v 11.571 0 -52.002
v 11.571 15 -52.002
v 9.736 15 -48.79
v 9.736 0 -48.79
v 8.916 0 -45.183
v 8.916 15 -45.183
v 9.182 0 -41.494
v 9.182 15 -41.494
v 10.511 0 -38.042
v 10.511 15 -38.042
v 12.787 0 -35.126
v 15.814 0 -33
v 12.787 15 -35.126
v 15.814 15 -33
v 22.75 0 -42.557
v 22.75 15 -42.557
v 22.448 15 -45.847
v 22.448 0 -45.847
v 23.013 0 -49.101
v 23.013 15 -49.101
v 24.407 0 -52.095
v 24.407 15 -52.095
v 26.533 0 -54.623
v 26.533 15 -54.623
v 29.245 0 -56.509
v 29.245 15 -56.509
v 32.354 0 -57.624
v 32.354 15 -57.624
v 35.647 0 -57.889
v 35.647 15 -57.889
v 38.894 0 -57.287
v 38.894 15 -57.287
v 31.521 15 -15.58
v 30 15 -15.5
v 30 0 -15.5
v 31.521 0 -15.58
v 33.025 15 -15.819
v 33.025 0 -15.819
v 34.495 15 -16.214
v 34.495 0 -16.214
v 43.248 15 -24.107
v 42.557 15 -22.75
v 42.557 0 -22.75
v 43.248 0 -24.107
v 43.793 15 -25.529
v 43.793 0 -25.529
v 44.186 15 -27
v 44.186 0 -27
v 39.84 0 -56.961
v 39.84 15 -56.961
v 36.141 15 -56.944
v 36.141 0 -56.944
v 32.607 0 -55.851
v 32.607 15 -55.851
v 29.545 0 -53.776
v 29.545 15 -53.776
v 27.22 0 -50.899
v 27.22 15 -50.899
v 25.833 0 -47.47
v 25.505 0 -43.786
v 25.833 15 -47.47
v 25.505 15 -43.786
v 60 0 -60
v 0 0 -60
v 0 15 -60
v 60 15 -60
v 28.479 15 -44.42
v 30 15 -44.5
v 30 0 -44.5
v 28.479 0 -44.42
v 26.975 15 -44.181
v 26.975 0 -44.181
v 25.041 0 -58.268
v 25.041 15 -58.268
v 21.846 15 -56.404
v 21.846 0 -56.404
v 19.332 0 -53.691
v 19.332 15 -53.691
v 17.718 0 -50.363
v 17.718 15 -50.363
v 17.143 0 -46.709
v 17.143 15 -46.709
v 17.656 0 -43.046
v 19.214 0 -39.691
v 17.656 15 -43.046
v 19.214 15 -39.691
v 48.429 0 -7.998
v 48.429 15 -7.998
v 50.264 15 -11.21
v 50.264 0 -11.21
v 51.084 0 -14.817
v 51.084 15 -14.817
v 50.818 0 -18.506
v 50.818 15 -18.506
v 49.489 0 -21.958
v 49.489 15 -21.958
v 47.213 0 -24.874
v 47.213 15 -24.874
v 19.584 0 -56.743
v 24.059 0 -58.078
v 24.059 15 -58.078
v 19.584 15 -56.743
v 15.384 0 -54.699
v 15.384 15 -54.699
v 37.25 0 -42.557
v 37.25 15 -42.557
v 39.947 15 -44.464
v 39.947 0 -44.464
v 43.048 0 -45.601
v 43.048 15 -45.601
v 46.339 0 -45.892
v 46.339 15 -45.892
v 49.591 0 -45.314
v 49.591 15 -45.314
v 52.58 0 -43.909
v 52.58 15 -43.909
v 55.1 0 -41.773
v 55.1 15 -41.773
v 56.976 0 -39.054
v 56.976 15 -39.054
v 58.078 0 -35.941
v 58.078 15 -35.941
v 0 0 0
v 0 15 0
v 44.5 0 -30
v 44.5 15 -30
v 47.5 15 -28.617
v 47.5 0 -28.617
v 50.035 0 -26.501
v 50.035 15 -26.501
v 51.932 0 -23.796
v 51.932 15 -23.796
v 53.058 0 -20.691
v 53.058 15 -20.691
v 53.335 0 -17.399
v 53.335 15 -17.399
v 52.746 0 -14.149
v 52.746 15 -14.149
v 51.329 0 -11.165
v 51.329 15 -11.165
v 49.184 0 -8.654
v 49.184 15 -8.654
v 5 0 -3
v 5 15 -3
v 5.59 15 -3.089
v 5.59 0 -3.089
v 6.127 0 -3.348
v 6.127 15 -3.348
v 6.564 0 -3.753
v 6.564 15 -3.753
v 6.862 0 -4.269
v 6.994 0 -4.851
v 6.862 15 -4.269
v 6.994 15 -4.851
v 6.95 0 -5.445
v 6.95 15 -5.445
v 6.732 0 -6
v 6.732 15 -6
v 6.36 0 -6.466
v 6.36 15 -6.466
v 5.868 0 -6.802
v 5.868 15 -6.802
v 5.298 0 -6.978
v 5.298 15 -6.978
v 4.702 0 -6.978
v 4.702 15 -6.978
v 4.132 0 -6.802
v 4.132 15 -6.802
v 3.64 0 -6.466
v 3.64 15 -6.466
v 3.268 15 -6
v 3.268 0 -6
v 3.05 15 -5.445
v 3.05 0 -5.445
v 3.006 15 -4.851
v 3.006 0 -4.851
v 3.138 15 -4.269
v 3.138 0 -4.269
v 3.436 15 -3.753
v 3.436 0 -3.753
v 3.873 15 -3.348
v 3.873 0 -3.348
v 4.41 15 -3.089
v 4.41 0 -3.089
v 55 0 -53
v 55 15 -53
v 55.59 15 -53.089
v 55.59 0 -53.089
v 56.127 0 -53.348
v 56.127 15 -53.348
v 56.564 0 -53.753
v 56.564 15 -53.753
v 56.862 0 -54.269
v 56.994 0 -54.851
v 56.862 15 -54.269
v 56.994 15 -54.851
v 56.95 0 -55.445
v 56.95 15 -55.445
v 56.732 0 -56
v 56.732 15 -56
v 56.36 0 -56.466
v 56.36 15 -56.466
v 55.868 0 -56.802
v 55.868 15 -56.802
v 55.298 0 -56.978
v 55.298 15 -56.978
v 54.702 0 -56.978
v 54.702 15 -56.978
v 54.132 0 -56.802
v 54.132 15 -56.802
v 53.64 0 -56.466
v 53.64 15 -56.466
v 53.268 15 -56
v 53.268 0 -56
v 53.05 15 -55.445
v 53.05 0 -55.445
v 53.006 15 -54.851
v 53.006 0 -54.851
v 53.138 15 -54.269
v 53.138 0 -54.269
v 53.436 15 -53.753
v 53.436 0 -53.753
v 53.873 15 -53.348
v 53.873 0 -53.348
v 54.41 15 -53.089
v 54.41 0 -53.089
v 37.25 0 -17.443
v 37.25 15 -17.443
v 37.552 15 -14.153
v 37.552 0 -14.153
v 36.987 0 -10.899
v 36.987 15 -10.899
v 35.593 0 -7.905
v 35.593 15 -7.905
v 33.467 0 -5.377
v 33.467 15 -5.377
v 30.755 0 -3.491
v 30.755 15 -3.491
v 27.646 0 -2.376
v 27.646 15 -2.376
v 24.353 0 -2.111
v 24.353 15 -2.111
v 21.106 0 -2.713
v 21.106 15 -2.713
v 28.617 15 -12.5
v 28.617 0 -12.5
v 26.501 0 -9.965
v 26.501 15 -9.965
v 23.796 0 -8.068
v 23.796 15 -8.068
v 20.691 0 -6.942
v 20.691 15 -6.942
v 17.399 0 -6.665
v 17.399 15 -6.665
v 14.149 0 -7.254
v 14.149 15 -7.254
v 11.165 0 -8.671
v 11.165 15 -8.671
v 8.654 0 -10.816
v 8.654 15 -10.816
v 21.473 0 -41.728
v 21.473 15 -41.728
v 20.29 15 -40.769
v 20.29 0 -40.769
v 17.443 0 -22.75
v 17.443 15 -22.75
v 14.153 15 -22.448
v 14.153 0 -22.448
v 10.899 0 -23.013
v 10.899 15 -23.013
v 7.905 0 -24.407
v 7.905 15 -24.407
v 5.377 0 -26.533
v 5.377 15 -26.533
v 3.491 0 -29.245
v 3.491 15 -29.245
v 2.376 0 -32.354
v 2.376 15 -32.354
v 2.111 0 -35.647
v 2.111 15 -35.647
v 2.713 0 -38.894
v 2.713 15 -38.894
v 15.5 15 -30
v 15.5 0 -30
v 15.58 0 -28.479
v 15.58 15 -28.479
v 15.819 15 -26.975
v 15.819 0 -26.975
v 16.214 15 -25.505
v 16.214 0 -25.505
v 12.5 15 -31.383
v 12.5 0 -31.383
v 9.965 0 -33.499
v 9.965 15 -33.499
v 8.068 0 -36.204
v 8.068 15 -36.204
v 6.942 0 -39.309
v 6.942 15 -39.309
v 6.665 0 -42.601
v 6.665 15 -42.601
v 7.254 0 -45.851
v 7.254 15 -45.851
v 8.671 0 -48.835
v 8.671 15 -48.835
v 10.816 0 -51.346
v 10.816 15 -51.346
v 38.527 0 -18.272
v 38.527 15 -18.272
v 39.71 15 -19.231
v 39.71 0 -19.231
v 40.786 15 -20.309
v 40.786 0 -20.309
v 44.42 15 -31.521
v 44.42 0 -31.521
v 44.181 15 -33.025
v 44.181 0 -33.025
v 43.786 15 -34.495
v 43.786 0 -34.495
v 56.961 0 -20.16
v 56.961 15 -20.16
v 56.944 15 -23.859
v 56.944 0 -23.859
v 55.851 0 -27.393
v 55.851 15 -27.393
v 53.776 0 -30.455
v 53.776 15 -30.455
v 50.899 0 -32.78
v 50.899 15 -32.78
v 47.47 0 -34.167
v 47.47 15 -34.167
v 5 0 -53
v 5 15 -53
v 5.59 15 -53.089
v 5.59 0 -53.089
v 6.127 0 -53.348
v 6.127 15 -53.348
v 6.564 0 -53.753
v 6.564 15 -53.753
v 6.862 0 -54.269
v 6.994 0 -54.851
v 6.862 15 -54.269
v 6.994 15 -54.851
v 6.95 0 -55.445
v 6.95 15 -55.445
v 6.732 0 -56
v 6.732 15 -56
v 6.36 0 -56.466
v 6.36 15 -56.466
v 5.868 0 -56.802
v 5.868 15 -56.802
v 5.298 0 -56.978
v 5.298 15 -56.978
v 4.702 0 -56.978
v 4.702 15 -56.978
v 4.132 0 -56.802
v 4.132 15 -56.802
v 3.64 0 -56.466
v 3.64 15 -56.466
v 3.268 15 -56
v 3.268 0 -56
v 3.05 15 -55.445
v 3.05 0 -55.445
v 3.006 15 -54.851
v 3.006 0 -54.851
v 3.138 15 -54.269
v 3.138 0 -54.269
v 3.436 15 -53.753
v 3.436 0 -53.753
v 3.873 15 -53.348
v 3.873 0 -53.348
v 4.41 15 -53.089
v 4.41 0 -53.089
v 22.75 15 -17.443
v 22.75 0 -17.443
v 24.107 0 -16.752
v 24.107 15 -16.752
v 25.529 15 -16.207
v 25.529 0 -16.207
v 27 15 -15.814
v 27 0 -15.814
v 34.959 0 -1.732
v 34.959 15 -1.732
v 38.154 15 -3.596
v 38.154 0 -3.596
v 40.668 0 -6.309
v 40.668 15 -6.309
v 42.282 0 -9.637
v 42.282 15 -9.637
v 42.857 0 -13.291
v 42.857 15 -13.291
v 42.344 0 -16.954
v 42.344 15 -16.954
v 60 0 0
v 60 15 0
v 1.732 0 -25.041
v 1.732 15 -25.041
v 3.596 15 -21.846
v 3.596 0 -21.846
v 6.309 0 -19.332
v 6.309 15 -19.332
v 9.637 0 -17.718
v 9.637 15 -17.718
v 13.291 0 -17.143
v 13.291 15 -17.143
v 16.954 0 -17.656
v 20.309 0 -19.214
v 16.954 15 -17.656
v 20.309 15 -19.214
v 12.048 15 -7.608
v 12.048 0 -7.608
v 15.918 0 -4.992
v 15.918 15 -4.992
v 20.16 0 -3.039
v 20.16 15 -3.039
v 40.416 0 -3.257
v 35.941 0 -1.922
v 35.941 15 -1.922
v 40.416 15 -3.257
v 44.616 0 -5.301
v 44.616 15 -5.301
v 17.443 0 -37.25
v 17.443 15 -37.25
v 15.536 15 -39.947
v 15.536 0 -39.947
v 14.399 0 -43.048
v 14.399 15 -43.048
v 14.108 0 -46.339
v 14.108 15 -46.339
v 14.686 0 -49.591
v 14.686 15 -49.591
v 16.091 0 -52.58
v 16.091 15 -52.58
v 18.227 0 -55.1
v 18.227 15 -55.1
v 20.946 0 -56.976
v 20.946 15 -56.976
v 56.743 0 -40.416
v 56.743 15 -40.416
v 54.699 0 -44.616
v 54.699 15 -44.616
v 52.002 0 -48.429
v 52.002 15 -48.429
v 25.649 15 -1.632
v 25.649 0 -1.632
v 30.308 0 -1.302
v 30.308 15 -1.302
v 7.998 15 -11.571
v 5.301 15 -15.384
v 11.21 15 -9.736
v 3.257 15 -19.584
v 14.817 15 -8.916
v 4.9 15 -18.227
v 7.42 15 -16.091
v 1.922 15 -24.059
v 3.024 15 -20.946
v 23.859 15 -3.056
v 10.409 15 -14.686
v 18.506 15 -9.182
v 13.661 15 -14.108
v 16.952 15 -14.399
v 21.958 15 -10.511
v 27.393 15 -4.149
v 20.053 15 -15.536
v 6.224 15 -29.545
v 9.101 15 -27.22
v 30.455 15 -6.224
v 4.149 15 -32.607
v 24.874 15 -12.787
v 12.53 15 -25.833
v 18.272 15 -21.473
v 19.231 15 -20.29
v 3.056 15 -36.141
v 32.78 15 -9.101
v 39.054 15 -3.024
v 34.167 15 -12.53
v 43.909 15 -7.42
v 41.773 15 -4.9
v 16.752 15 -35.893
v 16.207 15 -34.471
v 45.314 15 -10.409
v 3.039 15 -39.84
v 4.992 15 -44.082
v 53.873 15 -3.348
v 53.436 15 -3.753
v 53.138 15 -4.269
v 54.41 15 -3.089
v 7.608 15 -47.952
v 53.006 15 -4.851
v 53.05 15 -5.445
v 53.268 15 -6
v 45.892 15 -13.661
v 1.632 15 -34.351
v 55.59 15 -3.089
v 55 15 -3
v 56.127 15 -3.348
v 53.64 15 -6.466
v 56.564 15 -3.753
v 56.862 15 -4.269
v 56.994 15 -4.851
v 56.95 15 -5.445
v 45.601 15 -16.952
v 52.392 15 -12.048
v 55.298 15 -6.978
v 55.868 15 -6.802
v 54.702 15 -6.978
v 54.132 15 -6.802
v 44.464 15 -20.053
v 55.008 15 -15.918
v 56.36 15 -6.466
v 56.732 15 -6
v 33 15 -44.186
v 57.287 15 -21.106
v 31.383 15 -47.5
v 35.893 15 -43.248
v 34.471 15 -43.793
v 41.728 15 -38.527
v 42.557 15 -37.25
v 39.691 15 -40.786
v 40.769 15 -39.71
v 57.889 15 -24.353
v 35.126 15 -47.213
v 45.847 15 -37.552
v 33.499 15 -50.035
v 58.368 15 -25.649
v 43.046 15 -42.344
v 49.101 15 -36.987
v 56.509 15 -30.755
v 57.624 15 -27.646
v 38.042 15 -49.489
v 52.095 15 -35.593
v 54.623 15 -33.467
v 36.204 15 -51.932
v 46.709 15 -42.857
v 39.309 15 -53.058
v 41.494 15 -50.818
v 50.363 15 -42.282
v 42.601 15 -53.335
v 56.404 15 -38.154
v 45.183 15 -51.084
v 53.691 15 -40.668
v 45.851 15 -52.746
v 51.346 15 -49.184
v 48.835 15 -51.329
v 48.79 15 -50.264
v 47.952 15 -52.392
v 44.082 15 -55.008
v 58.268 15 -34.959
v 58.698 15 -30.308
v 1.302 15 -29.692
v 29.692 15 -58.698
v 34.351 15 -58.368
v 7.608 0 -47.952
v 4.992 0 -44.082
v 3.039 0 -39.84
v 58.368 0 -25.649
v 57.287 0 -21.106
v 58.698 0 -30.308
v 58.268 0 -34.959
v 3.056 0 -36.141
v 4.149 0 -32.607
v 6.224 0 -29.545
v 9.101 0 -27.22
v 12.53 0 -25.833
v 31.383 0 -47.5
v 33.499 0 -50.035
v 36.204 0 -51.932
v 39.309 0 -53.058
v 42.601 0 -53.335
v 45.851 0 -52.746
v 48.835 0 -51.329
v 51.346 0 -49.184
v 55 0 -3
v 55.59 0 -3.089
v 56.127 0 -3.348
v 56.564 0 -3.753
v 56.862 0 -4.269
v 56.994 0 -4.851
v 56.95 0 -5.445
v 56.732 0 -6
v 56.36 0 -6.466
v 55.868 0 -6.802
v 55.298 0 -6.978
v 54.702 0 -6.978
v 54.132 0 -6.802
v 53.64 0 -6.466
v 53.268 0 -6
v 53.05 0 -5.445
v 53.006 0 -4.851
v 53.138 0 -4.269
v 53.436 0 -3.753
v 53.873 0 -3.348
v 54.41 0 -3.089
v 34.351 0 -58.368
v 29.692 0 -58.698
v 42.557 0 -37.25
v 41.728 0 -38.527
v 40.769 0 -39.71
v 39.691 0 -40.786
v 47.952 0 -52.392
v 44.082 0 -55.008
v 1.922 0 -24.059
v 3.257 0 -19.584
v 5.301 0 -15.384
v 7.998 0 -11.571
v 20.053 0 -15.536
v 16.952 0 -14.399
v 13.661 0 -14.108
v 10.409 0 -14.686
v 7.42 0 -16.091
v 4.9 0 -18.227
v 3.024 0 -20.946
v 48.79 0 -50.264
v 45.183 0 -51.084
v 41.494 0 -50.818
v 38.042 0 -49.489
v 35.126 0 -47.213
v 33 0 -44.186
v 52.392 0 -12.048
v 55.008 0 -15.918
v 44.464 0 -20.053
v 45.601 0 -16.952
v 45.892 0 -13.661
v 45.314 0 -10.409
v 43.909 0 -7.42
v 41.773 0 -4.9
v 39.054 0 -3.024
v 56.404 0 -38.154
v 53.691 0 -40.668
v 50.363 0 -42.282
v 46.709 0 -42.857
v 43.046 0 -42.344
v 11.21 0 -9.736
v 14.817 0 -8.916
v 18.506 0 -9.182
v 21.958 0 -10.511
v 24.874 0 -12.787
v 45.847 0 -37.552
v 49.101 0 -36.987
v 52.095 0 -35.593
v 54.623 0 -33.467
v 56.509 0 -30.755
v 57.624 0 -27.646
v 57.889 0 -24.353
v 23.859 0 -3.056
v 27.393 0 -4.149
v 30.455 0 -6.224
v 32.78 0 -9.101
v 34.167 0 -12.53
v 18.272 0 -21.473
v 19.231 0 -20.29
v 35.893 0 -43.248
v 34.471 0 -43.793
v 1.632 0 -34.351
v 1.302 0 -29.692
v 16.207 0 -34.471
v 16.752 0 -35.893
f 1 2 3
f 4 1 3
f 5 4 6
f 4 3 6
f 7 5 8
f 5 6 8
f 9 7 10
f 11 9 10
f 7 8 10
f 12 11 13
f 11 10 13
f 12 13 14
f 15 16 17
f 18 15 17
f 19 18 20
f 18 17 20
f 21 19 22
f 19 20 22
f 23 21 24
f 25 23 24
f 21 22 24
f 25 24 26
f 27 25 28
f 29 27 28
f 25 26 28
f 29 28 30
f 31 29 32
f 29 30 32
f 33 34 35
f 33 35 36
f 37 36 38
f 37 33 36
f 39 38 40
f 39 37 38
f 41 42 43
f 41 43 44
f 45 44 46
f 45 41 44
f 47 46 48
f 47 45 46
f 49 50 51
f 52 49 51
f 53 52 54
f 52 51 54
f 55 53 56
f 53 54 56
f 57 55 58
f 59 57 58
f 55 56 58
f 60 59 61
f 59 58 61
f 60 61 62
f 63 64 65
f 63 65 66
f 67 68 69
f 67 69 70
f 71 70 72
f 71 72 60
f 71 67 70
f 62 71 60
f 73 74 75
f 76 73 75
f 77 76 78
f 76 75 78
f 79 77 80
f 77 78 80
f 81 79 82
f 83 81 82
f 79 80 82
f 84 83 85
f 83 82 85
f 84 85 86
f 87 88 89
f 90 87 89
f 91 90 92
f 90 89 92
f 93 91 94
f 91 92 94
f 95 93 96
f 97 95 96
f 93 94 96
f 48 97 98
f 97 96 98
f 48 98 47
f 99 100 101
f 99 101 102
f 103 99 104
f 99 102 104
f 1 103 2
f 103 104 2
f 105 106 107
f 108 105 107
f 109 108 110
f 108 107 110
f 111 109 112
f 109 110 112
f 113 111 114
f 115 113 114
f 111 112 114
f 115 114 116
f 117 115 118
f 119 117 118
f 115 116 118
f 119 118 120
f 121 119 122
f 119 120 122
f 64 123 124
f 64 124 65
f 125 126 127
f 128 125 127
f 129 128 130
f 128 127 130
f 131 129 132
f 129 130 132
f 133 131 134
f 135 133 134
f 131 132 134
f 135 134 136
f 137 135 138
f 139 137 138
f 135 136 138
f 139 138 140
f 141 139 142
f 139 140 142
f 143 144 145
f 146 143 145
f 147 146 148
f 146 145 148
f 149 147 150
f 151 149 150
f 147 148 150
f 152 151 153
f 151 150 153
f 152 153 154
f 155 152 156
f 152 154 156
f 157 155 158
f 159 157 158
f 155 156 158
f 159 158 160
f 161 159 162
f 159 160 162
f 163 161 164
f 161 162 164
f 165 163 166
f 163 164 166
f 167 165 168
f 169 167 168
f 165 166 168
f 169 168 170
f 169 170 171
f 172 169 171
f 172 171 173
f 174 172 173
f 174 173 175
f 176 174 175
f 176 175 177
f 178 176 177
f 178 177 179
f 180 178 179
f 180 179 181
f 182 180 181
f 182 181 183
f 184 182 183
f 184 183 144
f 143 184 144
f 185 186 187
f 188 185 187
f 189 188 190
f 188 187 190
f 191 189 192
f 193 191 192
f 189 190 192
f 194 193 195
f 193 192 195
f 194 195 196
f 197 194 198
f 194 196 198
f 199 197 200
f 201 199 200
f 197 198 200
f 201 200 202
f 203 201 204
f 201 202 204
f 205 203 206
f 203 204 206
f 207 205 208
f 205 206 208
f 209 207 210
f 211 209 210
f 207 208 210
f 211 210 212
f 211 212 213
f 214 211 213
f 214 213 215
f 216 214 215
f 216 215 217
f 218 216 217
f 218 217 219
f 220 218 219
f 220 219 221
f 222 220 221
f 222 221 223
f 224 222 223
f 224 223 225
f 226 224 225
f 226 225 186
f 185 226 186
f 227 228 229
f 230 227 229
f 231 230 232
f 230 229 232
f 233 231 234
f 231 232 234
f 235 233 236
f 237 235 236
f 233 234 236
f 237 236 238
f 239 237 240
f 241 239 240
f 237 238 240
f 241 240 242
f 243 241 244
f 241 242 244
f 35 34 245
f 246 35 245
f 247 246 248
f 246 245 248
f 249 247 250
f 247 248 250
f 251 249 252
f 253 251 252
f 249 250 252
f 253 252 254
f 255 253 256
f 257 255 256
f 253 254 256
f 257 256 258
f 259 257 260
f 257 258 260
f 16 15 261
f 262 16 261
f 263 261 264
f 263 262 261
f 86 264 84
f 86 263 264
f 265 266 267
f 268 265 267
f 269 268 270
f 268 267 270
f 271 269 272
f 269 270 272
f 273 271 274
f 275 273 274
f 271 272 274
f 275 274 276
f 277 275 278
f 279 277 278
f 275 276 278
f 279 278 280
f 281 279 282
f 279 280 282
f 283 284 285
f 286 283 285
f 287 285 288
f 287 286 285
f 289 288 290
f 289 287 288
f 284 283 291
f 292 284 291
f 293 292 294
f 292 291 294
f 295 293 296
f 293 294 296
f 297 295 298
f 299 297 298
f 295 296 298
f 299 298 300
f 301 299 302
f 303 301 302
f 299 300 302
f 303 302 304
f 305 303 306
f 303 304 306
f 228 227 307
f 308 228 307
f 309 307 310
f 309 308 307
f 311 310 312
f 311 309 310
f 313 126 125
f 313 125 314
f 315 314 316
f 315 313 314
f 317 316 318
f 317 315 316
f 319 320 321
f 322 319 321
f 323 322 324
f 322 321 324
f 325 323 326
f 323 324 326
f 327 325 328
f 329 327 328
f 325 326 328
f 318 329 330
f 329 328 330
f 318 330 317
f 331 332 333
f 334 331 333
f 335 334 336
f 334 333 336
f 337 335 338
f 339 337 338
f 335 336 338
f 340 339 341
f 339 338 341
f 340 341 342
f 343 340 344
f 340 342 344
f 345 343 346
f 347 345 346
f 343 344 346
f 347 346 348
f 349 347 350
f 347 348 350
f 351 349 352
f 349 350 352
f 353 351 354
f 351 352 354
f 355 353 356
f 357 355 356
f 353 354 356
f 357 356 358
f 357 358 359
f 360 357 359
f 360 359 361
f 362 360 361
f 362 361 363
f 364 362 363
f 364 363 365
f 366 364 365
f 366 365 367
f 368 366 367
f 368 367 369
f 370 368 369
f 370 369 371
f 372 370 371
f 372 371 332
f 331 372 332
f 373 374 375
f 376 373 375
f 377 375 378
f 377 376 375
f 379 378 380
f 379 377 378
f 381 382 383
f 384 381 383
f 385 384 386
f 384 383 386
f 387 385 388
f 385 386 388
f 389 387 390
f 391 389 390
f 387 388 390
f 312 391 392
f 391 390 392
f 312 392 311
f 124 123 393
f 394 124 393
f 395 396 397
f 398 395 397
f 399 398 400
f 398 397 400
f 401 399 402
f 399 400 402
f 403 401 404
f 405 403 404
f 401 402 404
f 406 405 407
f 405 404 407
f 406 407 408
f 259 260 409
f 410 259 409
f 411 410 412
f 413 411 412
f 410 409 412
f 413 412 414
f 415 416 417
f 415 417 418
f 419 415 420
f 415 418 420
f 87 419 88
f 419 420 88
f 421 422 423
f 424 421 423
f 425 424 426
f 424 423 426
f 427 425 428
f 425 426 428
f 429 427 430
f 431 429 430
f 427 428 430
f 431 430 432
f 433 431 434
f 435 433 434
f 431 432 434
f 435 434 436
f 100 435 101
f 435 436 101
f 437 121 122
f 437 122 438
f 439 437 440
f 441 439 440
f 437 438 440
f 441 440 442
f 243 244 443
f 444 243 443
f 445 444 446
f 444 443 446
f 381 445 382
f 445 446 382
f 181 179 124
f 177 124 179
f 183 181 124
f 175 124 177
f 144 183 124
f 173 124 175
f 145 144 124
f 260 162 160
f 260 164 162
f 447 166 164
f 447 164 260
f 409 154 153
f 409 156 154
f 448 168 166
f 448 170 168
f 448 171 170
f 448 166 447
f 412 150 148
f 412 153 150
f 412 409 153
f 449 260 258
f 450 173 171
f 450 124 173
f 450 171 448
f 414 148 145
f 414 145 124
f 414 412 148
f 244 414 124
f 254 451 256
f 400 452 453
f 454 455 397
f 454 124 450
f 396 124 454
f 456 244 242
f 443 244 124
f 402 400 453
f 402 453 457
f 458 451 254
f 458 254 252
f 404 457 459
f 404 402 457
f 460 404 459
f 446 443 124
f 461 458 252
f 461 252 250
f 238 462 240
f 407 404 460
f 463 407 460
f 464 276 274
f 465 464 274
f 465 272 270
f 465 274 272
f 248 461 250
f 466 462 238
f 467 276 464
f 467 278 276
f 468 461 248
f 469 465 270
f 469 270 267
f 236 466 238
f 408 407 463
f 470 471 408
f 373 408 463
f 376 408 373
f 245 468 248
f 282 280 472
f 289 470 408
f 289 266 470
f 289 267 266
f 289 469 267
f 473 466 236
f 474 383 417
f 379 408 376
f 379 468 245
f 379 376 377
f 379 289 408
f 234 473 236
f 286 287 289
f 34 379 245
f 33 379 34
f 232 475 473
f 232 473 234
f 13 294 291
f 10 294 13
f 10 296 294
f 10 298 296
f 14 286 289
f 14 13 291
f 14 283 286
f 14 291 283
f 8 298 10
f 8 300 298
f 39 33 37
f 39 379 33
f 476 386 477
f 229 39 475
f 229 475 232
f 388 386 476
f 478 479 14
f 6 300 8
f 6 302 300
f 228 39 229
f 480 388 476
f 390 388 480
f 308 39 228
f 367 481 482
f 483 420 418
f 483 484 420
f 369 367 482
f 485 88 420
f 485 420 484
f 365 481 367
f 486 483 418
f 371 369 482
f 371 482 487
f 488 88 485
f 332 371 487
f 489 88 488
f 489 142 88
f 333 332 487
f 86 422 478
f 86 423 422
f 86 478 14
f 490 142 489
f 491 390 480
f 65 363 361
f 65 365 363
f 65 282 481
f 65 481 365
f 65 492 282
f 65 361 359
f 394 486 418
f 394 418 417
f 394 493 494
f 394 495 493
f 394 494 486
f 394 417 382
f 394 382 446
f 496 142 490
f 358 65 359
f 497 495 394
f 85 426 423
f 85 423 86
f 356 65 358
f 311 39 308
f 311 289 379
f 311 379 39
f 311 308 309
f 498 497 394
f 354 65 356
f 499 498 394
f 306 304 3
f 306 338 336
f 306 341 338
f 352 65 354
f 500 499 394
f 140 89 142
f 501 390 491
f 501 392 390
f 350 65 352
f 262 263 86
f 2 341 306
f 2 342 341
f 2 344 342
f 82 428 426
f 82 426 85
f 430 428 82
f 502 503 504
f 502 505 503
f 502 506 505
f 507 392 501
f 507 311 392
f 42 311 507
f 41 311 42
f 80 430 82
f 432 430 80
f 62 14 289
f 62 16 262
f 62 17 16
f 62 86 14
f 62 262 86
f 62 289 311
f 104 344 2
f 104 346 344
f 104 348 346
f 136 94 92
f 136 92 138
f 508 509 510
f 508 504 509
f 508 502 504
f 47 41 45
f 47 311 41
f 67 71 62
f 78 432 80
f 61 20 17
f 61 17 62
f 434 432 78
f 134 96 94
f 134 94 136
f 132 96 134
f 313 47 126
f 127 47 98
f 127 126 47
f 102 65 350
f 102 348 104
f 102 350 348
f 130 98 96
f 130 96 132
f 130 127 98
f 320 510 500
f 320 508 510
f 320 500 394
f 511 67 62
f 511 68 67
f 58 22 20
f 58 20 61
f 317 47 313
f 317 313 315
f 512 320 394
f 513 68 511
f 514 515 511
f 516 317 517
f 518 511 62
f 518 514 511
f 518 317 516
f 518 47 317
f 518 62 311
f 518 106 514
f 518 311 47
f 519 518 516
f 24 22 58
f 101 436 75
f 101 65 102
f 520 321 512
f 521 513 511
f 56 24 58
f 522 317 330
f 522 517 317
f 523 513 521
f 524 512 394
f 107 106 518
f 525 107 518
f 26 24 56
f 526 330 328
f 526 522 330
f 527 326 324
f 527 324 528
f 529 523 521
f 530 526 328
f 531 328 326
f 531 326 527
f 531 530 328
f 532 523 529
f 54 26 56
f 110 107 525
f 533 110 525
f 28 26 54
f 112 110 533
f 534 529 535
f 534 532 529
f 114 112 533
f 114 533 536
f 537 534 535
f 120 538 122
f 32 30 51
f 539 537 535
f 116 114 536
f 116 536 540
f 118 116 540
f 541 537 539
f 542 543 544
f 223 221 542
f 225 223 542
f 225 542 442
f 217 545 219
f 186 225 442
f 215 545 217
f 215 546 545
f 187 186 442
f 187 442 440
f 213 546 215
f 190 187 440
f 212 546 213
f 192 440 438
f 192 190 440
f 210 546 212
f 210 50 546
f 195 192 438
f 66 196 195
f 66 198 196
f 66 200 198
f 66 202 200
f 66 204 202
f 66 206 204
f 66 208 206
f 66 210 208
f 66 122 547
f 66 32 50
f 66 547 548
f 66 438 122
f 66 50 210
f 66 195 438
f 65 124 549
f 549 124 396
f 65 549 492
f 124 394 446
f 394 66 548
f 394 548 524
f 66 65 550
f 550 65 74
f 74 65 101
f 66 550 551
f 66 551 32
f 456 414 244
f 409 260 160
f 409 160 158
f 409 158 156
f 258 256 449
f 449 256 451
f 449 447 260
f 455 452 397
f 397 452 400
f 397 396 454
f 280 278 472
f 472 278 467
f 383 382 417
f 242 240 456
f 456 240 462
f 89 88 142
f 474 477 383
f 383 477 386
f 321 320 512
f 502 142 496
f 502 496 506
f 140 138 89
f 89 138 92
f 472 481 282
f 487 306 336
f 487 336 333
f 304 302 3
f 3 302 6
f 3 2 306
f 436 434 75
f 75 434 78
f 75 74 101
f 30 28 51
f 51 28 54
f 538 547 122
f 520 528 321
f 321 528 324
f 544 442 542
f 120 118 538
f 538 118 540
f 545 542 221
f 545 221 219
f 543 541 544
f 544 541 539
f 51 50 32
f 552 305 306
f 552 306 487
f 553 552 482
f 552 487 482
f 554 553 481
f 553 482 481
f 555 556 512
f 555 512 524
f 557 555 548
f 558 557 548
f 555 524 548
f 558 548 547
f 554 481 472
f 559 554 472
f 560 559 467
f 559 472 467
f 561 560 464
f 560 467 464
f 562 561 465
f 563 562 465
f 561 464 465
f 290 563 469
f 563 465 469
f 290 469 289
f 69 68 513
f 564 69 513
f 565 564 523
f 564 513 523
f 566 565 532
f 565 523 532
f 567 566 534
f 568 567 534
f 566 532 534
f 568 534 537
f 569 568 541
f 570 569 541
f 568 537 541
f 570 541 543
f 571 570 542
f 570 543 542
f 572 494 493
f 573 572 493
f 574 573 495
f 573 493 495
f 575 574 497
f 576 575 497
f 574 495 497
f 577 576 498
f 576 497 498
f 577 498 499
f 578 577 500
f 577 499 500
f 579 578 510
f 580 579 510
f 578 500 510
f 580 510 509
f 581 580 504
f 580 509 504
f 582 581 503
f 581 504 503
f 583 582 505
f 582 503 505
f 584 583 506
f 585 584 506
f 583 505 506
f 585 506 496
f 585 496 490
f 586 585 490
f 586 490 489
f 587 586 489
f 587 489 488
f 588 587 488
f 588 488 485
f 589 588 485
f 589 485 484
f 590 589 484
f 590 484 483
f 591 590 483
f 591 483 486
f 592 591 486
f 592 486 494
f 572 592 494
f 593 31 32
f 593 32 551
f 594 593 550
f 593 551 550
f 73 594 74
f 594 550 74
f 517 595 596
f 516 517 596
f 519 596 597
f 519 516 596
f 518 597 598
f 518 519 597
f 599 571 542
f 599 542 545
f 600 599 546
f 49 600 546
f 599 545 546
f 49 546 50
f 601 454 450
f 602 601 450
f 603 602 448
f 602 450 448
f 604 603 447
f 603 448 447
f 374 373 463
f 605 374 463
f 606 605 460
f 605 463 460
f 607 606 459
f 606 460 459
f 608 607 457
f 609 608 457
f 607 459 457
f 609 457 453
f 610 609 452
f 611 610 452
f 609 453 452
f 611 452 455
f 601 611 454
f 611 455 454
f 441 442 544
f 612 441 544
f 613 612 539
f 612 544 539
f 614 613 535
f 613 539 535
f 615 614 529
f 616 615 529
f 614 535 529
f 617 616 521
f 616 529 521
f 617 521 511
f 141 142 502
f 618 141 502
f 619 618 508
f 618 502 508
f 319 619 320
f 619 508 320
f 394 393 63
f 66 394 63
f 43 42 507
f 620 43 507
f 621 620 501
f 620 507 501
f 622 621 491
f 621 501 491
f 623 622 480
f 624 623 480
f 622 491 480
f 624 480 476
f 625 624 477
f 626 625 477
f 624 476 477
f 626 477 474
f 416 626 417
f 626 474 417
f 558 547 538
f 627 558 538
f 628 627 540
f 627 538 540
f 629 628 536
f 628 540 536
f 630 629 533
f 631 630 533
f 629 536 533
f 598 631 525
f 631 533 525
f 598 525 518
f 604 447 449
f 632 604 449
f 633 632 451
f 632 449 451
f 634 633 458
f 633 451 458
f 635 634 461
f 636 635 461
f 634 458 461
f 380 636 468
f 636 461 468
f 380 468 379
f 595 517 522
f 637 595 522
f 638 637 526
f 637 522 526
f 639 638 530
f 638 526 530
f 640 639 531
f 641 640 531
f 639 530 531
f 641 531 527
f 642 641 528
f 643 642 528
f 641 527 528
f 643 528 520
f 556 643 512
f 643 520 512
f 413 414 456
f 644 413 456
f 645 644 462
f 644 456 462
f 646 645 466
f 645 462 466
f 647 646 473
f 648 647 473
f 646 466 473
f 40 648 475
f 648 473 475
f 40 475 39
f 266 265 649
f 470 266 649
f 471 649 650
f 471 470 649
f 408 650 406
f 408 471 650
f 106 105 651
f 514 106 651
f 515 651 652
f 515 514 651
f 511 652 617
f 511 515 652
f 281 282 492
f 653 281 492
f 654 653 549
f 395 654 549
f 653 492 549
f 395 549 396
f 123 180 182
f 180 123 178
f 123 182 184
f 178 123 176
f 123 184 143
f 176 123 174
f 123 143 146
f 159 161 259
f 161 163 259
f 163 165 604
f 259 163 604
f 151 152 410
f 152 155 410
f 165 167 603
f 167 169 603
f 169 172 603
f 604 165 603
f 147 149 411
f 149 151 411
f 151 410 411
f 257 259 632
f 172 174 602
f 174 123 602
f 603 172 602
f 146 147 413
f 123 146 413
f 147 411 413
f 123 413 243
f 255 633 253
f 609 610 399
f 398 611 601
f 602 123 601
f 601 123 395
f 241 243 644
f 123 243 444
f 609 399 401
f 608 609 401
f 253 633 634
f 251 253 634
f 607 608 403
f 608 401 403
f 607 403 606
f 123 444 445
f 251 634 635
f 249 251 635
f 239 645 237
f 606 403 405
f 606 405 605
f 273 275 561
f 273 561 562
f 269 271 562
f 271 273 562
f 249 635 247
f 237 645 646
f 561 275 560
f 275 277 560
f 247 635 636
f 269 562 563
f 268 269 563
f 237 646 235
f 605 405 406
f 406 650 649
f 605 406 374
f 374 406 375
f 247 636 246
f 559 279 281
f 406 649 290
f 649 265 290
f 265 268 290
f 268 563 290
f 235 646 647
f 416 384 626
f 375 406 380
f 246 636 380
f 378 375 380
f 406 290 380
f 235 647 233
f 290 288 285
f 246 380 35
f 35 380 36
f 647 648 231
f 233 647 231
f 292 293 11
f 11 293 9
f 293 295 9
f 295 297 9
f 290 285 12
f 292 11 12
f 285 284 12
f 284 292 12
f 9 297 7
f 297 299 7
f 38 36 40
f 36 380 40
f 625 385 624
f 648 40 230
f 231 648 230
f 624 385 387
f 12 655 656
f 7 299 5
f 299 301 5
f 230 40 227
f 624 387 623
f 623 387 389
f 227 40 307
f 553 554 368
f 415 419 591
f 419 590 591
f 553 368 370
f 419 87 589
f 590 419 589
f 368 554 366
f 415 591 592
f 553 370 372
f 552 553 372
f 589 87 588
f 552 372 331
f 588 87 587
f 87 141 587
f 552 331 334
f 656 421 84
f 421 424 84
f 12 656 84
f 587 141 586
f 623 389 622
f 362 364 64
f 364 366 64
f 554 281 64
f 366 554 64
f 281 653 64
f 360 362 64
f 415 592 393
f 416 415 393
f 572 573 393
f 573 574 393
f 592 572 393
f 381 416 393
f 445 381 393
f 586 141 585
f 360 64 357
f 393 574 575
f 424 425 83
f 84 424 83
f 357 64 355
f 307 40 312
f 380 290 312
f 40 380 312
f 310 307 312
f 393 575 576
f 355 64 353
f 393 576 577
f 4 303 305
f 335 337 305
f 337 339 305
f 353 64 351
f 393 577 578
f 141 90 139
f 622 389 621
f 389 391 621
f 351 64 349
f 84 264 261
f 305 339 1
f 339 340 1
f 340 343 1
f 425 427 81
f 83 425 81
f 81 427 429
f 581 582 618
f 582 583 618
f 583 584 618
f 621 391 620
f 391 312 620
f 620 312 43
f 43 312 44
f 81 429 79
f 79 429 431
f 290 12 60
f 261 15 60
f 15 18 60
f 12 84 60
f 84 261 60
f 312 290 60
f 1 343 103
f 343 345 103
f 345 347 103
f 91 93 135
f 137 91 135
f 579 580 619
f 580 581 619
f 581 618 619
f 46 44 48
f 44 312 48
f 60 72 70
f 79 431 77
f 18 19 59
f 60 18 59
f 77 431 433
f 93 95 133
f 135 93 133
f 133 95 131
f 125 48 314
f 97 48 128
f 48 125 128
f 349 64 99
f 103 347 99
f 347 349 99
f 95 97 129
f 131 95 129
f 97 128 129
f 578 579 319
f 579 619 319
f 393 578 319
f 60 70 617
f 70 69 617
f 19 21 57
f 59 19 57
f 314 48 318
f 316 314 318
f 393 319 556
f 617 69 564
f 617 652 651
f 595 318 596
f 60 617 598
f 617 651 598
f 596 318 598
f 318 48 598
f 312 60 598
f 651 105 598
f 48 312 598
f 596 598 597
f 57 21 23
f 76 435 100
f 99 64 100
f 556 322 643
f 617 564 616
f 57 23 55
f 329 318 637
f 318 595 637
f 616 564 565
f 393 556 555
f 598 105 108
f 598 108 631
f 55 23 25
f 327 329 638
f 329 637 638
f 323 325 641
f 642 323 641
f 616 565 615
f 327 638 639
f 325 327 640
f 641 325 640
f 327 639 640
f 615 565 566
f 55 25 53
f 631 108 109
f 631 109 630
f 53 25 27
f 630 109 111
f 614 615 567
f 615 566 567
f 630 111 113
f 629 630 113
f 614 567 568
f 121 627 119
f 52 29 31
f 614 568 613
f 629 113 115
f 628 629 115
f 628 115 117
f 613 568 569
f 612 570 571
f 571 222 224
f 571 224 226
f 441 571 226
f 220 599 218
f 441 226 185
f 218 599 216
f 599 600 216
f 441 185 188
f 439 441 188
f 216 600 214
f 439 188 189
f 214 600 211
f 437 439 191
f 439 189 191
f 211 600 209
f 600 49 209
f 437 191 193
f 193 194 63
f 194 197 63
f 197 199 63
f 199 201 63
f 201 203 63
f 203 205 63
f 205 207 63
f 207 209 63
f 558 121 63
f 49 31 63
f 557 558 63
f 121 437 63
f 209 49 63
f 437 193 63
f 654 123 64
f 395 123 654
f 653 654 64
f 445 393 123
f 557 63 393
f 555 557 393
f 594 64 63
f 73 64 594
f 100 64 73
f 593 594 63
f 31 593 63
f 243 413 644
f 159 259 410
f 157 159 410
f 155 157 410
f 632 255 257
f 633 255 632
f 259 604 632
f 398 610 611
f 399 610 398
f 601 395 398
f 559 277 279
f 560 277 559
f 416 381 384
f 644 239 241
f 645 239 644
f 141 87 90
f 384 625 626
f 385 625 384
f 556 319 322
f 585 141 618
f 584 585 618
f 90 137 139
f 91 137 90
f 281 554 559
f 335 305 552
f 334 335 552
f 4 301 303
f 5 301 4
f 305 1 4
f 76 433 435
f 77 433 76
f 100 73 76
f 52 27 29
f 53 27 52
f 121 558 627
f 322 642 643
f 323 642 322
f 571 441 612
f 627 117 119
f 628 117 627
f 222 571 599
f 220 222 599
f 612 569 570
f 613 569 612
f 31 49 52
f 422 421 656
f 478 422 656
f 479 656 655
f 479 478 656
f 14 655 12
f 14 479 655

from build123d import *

# Parameters (mm, degrees)
SKETCH1_W           = 60
SKETCH1_H           = 60
BOSS_EXTRUDE1_DEPTH = 15
SKETCH2_R           = 28.7
SKETCH2_R_2         = 14.5
CUT_EXTRUDE1_DEPTH  = 87.168439698
BOSS_EXTRUDE2_DEPTH = 15
CIRPATTERN1_COUNT   = 12
SKETCH4_R           = 2
CUT_EXTRUDE2_DEPTH  = 87.168439698


with BuildPart() as part:
    # Sketch1 → Boss-Extrude1 (new body)
    with BuildSketch(Plane(origin=(0, 0, 0), x_dir=(1, 0, 0), z_dir=(0, 1, 0))):
        with Locations((30, 30)):
            Rectangle(SKETCH1_W, SKETCH1_H)
    extrude(amount=BOSS_EXTRUDE1_DEPTH)

    # Sketch2 → Cut-Extrude1 (cut, through all)
    with BuildSketch(Plane(origin=(0, 15, 0), x_dir=(1, 0, 0), z_dir=(0, 1, 0))):
        with Locations(Location((30, 30, 0), (0, 0, 270))):
            Circle(SKETCH2_R)
        with Locations(Location((30, 30, 0), (0, 0, 270))):
            Circle(SKETCH2_R_2, mode=Mode.SUBTRACT)
    extrude(amount=-CUT_EXTRUDE1_DEPTH, mode=Mode.SUBTRACT)


with BuildPart() as cut_extrude1_piece_1:
    # of the separate pieces the step leaves, piece 1, a body of its own (cut_extrude1_pieces)
    add(part.part.solids().sort_by_distance((0, 0, 0))[0])



with BuildPart() as cut_extrude1_piece_2:
    # of the separate pieces the step leaves, piece 2, a body of its own (cut_extrude1_pieces)
    add(part.part.solids().sort_by_distance((30, 0, -15.5))[0])


with BuildPart() as cut_extrude1_piece_1_1:
    add(cut_extrude1_piece_1.part)

    add(cut_extrude1_piece_2.part)  # Boss-Extrude2 merges Cut-Extrude1 piece 2
    # Sketch3 → Boss-Extrude2 (add)
    with BuildSketch(Plane(origin=(0, 15, 0), x_dir=(1, 0, 0), z_dir=(0, 1, 0))):
        with BuildLine():
            ThreePointArc((30, 44.5), (39.309158475, 53.057700875), (51.346185748, 49.184117233))
            ThreePointArc((51.346185748, 49.184117233), (51.677164158, 48.809320936), (52.001562784, 48.428815346))
            ThreePointArc((52.001562784, 48.428815346), (41.493720217, 50.817966163), (33, 44.186260959))
            ThreePointArc((33, 44.186260959), (31.508180376, 44.421351946), (30, 44.5))
        make_face()
    boss_extrude2 = extrude(amount=-BOSS_EXTRUDE2_DEPTH)

    # CirPattern1: Boss-Extrude2 ×12 about axis
    cirpattern1_axis = Axis((30, 0, -30), (0, 1, 0))
    for i in range(1, CIRPATTERN1_COUNT):
        add(boss_extrude2.rotate(cirpattern1_axis, i * 360 / CIRPATTERN1_COUNT))

    # Sketch4 → Cut-Extrude2 (cut, through all)
    with BuildSketch(Plane(origin=(0, 15, 0), x_dir=(1, 0, 0), z_dir=(0, 1, 0))):
        with Locations(Location((5, 55, 0), (0, 0, 270))):
            Circle(SKETCH4_R)
        with Locations(Location((55, 55, 0), (0, 0, 270))):
            Circle(SKETCH4_R)
        with Locations(Location((55, 5, 0), (0, 0, 270))):
            Circle(SKETCH4_R)
        with Locations(Location((5, 5, 0), (0, 0, 270))):
            Circle(SKETCH4_R)
    extrude(amount=-CUT_EXTRUDE2_DEPTH, mode=Mode.SUBTRACT)


solid = cut_extrude1_piece_1_1.part
